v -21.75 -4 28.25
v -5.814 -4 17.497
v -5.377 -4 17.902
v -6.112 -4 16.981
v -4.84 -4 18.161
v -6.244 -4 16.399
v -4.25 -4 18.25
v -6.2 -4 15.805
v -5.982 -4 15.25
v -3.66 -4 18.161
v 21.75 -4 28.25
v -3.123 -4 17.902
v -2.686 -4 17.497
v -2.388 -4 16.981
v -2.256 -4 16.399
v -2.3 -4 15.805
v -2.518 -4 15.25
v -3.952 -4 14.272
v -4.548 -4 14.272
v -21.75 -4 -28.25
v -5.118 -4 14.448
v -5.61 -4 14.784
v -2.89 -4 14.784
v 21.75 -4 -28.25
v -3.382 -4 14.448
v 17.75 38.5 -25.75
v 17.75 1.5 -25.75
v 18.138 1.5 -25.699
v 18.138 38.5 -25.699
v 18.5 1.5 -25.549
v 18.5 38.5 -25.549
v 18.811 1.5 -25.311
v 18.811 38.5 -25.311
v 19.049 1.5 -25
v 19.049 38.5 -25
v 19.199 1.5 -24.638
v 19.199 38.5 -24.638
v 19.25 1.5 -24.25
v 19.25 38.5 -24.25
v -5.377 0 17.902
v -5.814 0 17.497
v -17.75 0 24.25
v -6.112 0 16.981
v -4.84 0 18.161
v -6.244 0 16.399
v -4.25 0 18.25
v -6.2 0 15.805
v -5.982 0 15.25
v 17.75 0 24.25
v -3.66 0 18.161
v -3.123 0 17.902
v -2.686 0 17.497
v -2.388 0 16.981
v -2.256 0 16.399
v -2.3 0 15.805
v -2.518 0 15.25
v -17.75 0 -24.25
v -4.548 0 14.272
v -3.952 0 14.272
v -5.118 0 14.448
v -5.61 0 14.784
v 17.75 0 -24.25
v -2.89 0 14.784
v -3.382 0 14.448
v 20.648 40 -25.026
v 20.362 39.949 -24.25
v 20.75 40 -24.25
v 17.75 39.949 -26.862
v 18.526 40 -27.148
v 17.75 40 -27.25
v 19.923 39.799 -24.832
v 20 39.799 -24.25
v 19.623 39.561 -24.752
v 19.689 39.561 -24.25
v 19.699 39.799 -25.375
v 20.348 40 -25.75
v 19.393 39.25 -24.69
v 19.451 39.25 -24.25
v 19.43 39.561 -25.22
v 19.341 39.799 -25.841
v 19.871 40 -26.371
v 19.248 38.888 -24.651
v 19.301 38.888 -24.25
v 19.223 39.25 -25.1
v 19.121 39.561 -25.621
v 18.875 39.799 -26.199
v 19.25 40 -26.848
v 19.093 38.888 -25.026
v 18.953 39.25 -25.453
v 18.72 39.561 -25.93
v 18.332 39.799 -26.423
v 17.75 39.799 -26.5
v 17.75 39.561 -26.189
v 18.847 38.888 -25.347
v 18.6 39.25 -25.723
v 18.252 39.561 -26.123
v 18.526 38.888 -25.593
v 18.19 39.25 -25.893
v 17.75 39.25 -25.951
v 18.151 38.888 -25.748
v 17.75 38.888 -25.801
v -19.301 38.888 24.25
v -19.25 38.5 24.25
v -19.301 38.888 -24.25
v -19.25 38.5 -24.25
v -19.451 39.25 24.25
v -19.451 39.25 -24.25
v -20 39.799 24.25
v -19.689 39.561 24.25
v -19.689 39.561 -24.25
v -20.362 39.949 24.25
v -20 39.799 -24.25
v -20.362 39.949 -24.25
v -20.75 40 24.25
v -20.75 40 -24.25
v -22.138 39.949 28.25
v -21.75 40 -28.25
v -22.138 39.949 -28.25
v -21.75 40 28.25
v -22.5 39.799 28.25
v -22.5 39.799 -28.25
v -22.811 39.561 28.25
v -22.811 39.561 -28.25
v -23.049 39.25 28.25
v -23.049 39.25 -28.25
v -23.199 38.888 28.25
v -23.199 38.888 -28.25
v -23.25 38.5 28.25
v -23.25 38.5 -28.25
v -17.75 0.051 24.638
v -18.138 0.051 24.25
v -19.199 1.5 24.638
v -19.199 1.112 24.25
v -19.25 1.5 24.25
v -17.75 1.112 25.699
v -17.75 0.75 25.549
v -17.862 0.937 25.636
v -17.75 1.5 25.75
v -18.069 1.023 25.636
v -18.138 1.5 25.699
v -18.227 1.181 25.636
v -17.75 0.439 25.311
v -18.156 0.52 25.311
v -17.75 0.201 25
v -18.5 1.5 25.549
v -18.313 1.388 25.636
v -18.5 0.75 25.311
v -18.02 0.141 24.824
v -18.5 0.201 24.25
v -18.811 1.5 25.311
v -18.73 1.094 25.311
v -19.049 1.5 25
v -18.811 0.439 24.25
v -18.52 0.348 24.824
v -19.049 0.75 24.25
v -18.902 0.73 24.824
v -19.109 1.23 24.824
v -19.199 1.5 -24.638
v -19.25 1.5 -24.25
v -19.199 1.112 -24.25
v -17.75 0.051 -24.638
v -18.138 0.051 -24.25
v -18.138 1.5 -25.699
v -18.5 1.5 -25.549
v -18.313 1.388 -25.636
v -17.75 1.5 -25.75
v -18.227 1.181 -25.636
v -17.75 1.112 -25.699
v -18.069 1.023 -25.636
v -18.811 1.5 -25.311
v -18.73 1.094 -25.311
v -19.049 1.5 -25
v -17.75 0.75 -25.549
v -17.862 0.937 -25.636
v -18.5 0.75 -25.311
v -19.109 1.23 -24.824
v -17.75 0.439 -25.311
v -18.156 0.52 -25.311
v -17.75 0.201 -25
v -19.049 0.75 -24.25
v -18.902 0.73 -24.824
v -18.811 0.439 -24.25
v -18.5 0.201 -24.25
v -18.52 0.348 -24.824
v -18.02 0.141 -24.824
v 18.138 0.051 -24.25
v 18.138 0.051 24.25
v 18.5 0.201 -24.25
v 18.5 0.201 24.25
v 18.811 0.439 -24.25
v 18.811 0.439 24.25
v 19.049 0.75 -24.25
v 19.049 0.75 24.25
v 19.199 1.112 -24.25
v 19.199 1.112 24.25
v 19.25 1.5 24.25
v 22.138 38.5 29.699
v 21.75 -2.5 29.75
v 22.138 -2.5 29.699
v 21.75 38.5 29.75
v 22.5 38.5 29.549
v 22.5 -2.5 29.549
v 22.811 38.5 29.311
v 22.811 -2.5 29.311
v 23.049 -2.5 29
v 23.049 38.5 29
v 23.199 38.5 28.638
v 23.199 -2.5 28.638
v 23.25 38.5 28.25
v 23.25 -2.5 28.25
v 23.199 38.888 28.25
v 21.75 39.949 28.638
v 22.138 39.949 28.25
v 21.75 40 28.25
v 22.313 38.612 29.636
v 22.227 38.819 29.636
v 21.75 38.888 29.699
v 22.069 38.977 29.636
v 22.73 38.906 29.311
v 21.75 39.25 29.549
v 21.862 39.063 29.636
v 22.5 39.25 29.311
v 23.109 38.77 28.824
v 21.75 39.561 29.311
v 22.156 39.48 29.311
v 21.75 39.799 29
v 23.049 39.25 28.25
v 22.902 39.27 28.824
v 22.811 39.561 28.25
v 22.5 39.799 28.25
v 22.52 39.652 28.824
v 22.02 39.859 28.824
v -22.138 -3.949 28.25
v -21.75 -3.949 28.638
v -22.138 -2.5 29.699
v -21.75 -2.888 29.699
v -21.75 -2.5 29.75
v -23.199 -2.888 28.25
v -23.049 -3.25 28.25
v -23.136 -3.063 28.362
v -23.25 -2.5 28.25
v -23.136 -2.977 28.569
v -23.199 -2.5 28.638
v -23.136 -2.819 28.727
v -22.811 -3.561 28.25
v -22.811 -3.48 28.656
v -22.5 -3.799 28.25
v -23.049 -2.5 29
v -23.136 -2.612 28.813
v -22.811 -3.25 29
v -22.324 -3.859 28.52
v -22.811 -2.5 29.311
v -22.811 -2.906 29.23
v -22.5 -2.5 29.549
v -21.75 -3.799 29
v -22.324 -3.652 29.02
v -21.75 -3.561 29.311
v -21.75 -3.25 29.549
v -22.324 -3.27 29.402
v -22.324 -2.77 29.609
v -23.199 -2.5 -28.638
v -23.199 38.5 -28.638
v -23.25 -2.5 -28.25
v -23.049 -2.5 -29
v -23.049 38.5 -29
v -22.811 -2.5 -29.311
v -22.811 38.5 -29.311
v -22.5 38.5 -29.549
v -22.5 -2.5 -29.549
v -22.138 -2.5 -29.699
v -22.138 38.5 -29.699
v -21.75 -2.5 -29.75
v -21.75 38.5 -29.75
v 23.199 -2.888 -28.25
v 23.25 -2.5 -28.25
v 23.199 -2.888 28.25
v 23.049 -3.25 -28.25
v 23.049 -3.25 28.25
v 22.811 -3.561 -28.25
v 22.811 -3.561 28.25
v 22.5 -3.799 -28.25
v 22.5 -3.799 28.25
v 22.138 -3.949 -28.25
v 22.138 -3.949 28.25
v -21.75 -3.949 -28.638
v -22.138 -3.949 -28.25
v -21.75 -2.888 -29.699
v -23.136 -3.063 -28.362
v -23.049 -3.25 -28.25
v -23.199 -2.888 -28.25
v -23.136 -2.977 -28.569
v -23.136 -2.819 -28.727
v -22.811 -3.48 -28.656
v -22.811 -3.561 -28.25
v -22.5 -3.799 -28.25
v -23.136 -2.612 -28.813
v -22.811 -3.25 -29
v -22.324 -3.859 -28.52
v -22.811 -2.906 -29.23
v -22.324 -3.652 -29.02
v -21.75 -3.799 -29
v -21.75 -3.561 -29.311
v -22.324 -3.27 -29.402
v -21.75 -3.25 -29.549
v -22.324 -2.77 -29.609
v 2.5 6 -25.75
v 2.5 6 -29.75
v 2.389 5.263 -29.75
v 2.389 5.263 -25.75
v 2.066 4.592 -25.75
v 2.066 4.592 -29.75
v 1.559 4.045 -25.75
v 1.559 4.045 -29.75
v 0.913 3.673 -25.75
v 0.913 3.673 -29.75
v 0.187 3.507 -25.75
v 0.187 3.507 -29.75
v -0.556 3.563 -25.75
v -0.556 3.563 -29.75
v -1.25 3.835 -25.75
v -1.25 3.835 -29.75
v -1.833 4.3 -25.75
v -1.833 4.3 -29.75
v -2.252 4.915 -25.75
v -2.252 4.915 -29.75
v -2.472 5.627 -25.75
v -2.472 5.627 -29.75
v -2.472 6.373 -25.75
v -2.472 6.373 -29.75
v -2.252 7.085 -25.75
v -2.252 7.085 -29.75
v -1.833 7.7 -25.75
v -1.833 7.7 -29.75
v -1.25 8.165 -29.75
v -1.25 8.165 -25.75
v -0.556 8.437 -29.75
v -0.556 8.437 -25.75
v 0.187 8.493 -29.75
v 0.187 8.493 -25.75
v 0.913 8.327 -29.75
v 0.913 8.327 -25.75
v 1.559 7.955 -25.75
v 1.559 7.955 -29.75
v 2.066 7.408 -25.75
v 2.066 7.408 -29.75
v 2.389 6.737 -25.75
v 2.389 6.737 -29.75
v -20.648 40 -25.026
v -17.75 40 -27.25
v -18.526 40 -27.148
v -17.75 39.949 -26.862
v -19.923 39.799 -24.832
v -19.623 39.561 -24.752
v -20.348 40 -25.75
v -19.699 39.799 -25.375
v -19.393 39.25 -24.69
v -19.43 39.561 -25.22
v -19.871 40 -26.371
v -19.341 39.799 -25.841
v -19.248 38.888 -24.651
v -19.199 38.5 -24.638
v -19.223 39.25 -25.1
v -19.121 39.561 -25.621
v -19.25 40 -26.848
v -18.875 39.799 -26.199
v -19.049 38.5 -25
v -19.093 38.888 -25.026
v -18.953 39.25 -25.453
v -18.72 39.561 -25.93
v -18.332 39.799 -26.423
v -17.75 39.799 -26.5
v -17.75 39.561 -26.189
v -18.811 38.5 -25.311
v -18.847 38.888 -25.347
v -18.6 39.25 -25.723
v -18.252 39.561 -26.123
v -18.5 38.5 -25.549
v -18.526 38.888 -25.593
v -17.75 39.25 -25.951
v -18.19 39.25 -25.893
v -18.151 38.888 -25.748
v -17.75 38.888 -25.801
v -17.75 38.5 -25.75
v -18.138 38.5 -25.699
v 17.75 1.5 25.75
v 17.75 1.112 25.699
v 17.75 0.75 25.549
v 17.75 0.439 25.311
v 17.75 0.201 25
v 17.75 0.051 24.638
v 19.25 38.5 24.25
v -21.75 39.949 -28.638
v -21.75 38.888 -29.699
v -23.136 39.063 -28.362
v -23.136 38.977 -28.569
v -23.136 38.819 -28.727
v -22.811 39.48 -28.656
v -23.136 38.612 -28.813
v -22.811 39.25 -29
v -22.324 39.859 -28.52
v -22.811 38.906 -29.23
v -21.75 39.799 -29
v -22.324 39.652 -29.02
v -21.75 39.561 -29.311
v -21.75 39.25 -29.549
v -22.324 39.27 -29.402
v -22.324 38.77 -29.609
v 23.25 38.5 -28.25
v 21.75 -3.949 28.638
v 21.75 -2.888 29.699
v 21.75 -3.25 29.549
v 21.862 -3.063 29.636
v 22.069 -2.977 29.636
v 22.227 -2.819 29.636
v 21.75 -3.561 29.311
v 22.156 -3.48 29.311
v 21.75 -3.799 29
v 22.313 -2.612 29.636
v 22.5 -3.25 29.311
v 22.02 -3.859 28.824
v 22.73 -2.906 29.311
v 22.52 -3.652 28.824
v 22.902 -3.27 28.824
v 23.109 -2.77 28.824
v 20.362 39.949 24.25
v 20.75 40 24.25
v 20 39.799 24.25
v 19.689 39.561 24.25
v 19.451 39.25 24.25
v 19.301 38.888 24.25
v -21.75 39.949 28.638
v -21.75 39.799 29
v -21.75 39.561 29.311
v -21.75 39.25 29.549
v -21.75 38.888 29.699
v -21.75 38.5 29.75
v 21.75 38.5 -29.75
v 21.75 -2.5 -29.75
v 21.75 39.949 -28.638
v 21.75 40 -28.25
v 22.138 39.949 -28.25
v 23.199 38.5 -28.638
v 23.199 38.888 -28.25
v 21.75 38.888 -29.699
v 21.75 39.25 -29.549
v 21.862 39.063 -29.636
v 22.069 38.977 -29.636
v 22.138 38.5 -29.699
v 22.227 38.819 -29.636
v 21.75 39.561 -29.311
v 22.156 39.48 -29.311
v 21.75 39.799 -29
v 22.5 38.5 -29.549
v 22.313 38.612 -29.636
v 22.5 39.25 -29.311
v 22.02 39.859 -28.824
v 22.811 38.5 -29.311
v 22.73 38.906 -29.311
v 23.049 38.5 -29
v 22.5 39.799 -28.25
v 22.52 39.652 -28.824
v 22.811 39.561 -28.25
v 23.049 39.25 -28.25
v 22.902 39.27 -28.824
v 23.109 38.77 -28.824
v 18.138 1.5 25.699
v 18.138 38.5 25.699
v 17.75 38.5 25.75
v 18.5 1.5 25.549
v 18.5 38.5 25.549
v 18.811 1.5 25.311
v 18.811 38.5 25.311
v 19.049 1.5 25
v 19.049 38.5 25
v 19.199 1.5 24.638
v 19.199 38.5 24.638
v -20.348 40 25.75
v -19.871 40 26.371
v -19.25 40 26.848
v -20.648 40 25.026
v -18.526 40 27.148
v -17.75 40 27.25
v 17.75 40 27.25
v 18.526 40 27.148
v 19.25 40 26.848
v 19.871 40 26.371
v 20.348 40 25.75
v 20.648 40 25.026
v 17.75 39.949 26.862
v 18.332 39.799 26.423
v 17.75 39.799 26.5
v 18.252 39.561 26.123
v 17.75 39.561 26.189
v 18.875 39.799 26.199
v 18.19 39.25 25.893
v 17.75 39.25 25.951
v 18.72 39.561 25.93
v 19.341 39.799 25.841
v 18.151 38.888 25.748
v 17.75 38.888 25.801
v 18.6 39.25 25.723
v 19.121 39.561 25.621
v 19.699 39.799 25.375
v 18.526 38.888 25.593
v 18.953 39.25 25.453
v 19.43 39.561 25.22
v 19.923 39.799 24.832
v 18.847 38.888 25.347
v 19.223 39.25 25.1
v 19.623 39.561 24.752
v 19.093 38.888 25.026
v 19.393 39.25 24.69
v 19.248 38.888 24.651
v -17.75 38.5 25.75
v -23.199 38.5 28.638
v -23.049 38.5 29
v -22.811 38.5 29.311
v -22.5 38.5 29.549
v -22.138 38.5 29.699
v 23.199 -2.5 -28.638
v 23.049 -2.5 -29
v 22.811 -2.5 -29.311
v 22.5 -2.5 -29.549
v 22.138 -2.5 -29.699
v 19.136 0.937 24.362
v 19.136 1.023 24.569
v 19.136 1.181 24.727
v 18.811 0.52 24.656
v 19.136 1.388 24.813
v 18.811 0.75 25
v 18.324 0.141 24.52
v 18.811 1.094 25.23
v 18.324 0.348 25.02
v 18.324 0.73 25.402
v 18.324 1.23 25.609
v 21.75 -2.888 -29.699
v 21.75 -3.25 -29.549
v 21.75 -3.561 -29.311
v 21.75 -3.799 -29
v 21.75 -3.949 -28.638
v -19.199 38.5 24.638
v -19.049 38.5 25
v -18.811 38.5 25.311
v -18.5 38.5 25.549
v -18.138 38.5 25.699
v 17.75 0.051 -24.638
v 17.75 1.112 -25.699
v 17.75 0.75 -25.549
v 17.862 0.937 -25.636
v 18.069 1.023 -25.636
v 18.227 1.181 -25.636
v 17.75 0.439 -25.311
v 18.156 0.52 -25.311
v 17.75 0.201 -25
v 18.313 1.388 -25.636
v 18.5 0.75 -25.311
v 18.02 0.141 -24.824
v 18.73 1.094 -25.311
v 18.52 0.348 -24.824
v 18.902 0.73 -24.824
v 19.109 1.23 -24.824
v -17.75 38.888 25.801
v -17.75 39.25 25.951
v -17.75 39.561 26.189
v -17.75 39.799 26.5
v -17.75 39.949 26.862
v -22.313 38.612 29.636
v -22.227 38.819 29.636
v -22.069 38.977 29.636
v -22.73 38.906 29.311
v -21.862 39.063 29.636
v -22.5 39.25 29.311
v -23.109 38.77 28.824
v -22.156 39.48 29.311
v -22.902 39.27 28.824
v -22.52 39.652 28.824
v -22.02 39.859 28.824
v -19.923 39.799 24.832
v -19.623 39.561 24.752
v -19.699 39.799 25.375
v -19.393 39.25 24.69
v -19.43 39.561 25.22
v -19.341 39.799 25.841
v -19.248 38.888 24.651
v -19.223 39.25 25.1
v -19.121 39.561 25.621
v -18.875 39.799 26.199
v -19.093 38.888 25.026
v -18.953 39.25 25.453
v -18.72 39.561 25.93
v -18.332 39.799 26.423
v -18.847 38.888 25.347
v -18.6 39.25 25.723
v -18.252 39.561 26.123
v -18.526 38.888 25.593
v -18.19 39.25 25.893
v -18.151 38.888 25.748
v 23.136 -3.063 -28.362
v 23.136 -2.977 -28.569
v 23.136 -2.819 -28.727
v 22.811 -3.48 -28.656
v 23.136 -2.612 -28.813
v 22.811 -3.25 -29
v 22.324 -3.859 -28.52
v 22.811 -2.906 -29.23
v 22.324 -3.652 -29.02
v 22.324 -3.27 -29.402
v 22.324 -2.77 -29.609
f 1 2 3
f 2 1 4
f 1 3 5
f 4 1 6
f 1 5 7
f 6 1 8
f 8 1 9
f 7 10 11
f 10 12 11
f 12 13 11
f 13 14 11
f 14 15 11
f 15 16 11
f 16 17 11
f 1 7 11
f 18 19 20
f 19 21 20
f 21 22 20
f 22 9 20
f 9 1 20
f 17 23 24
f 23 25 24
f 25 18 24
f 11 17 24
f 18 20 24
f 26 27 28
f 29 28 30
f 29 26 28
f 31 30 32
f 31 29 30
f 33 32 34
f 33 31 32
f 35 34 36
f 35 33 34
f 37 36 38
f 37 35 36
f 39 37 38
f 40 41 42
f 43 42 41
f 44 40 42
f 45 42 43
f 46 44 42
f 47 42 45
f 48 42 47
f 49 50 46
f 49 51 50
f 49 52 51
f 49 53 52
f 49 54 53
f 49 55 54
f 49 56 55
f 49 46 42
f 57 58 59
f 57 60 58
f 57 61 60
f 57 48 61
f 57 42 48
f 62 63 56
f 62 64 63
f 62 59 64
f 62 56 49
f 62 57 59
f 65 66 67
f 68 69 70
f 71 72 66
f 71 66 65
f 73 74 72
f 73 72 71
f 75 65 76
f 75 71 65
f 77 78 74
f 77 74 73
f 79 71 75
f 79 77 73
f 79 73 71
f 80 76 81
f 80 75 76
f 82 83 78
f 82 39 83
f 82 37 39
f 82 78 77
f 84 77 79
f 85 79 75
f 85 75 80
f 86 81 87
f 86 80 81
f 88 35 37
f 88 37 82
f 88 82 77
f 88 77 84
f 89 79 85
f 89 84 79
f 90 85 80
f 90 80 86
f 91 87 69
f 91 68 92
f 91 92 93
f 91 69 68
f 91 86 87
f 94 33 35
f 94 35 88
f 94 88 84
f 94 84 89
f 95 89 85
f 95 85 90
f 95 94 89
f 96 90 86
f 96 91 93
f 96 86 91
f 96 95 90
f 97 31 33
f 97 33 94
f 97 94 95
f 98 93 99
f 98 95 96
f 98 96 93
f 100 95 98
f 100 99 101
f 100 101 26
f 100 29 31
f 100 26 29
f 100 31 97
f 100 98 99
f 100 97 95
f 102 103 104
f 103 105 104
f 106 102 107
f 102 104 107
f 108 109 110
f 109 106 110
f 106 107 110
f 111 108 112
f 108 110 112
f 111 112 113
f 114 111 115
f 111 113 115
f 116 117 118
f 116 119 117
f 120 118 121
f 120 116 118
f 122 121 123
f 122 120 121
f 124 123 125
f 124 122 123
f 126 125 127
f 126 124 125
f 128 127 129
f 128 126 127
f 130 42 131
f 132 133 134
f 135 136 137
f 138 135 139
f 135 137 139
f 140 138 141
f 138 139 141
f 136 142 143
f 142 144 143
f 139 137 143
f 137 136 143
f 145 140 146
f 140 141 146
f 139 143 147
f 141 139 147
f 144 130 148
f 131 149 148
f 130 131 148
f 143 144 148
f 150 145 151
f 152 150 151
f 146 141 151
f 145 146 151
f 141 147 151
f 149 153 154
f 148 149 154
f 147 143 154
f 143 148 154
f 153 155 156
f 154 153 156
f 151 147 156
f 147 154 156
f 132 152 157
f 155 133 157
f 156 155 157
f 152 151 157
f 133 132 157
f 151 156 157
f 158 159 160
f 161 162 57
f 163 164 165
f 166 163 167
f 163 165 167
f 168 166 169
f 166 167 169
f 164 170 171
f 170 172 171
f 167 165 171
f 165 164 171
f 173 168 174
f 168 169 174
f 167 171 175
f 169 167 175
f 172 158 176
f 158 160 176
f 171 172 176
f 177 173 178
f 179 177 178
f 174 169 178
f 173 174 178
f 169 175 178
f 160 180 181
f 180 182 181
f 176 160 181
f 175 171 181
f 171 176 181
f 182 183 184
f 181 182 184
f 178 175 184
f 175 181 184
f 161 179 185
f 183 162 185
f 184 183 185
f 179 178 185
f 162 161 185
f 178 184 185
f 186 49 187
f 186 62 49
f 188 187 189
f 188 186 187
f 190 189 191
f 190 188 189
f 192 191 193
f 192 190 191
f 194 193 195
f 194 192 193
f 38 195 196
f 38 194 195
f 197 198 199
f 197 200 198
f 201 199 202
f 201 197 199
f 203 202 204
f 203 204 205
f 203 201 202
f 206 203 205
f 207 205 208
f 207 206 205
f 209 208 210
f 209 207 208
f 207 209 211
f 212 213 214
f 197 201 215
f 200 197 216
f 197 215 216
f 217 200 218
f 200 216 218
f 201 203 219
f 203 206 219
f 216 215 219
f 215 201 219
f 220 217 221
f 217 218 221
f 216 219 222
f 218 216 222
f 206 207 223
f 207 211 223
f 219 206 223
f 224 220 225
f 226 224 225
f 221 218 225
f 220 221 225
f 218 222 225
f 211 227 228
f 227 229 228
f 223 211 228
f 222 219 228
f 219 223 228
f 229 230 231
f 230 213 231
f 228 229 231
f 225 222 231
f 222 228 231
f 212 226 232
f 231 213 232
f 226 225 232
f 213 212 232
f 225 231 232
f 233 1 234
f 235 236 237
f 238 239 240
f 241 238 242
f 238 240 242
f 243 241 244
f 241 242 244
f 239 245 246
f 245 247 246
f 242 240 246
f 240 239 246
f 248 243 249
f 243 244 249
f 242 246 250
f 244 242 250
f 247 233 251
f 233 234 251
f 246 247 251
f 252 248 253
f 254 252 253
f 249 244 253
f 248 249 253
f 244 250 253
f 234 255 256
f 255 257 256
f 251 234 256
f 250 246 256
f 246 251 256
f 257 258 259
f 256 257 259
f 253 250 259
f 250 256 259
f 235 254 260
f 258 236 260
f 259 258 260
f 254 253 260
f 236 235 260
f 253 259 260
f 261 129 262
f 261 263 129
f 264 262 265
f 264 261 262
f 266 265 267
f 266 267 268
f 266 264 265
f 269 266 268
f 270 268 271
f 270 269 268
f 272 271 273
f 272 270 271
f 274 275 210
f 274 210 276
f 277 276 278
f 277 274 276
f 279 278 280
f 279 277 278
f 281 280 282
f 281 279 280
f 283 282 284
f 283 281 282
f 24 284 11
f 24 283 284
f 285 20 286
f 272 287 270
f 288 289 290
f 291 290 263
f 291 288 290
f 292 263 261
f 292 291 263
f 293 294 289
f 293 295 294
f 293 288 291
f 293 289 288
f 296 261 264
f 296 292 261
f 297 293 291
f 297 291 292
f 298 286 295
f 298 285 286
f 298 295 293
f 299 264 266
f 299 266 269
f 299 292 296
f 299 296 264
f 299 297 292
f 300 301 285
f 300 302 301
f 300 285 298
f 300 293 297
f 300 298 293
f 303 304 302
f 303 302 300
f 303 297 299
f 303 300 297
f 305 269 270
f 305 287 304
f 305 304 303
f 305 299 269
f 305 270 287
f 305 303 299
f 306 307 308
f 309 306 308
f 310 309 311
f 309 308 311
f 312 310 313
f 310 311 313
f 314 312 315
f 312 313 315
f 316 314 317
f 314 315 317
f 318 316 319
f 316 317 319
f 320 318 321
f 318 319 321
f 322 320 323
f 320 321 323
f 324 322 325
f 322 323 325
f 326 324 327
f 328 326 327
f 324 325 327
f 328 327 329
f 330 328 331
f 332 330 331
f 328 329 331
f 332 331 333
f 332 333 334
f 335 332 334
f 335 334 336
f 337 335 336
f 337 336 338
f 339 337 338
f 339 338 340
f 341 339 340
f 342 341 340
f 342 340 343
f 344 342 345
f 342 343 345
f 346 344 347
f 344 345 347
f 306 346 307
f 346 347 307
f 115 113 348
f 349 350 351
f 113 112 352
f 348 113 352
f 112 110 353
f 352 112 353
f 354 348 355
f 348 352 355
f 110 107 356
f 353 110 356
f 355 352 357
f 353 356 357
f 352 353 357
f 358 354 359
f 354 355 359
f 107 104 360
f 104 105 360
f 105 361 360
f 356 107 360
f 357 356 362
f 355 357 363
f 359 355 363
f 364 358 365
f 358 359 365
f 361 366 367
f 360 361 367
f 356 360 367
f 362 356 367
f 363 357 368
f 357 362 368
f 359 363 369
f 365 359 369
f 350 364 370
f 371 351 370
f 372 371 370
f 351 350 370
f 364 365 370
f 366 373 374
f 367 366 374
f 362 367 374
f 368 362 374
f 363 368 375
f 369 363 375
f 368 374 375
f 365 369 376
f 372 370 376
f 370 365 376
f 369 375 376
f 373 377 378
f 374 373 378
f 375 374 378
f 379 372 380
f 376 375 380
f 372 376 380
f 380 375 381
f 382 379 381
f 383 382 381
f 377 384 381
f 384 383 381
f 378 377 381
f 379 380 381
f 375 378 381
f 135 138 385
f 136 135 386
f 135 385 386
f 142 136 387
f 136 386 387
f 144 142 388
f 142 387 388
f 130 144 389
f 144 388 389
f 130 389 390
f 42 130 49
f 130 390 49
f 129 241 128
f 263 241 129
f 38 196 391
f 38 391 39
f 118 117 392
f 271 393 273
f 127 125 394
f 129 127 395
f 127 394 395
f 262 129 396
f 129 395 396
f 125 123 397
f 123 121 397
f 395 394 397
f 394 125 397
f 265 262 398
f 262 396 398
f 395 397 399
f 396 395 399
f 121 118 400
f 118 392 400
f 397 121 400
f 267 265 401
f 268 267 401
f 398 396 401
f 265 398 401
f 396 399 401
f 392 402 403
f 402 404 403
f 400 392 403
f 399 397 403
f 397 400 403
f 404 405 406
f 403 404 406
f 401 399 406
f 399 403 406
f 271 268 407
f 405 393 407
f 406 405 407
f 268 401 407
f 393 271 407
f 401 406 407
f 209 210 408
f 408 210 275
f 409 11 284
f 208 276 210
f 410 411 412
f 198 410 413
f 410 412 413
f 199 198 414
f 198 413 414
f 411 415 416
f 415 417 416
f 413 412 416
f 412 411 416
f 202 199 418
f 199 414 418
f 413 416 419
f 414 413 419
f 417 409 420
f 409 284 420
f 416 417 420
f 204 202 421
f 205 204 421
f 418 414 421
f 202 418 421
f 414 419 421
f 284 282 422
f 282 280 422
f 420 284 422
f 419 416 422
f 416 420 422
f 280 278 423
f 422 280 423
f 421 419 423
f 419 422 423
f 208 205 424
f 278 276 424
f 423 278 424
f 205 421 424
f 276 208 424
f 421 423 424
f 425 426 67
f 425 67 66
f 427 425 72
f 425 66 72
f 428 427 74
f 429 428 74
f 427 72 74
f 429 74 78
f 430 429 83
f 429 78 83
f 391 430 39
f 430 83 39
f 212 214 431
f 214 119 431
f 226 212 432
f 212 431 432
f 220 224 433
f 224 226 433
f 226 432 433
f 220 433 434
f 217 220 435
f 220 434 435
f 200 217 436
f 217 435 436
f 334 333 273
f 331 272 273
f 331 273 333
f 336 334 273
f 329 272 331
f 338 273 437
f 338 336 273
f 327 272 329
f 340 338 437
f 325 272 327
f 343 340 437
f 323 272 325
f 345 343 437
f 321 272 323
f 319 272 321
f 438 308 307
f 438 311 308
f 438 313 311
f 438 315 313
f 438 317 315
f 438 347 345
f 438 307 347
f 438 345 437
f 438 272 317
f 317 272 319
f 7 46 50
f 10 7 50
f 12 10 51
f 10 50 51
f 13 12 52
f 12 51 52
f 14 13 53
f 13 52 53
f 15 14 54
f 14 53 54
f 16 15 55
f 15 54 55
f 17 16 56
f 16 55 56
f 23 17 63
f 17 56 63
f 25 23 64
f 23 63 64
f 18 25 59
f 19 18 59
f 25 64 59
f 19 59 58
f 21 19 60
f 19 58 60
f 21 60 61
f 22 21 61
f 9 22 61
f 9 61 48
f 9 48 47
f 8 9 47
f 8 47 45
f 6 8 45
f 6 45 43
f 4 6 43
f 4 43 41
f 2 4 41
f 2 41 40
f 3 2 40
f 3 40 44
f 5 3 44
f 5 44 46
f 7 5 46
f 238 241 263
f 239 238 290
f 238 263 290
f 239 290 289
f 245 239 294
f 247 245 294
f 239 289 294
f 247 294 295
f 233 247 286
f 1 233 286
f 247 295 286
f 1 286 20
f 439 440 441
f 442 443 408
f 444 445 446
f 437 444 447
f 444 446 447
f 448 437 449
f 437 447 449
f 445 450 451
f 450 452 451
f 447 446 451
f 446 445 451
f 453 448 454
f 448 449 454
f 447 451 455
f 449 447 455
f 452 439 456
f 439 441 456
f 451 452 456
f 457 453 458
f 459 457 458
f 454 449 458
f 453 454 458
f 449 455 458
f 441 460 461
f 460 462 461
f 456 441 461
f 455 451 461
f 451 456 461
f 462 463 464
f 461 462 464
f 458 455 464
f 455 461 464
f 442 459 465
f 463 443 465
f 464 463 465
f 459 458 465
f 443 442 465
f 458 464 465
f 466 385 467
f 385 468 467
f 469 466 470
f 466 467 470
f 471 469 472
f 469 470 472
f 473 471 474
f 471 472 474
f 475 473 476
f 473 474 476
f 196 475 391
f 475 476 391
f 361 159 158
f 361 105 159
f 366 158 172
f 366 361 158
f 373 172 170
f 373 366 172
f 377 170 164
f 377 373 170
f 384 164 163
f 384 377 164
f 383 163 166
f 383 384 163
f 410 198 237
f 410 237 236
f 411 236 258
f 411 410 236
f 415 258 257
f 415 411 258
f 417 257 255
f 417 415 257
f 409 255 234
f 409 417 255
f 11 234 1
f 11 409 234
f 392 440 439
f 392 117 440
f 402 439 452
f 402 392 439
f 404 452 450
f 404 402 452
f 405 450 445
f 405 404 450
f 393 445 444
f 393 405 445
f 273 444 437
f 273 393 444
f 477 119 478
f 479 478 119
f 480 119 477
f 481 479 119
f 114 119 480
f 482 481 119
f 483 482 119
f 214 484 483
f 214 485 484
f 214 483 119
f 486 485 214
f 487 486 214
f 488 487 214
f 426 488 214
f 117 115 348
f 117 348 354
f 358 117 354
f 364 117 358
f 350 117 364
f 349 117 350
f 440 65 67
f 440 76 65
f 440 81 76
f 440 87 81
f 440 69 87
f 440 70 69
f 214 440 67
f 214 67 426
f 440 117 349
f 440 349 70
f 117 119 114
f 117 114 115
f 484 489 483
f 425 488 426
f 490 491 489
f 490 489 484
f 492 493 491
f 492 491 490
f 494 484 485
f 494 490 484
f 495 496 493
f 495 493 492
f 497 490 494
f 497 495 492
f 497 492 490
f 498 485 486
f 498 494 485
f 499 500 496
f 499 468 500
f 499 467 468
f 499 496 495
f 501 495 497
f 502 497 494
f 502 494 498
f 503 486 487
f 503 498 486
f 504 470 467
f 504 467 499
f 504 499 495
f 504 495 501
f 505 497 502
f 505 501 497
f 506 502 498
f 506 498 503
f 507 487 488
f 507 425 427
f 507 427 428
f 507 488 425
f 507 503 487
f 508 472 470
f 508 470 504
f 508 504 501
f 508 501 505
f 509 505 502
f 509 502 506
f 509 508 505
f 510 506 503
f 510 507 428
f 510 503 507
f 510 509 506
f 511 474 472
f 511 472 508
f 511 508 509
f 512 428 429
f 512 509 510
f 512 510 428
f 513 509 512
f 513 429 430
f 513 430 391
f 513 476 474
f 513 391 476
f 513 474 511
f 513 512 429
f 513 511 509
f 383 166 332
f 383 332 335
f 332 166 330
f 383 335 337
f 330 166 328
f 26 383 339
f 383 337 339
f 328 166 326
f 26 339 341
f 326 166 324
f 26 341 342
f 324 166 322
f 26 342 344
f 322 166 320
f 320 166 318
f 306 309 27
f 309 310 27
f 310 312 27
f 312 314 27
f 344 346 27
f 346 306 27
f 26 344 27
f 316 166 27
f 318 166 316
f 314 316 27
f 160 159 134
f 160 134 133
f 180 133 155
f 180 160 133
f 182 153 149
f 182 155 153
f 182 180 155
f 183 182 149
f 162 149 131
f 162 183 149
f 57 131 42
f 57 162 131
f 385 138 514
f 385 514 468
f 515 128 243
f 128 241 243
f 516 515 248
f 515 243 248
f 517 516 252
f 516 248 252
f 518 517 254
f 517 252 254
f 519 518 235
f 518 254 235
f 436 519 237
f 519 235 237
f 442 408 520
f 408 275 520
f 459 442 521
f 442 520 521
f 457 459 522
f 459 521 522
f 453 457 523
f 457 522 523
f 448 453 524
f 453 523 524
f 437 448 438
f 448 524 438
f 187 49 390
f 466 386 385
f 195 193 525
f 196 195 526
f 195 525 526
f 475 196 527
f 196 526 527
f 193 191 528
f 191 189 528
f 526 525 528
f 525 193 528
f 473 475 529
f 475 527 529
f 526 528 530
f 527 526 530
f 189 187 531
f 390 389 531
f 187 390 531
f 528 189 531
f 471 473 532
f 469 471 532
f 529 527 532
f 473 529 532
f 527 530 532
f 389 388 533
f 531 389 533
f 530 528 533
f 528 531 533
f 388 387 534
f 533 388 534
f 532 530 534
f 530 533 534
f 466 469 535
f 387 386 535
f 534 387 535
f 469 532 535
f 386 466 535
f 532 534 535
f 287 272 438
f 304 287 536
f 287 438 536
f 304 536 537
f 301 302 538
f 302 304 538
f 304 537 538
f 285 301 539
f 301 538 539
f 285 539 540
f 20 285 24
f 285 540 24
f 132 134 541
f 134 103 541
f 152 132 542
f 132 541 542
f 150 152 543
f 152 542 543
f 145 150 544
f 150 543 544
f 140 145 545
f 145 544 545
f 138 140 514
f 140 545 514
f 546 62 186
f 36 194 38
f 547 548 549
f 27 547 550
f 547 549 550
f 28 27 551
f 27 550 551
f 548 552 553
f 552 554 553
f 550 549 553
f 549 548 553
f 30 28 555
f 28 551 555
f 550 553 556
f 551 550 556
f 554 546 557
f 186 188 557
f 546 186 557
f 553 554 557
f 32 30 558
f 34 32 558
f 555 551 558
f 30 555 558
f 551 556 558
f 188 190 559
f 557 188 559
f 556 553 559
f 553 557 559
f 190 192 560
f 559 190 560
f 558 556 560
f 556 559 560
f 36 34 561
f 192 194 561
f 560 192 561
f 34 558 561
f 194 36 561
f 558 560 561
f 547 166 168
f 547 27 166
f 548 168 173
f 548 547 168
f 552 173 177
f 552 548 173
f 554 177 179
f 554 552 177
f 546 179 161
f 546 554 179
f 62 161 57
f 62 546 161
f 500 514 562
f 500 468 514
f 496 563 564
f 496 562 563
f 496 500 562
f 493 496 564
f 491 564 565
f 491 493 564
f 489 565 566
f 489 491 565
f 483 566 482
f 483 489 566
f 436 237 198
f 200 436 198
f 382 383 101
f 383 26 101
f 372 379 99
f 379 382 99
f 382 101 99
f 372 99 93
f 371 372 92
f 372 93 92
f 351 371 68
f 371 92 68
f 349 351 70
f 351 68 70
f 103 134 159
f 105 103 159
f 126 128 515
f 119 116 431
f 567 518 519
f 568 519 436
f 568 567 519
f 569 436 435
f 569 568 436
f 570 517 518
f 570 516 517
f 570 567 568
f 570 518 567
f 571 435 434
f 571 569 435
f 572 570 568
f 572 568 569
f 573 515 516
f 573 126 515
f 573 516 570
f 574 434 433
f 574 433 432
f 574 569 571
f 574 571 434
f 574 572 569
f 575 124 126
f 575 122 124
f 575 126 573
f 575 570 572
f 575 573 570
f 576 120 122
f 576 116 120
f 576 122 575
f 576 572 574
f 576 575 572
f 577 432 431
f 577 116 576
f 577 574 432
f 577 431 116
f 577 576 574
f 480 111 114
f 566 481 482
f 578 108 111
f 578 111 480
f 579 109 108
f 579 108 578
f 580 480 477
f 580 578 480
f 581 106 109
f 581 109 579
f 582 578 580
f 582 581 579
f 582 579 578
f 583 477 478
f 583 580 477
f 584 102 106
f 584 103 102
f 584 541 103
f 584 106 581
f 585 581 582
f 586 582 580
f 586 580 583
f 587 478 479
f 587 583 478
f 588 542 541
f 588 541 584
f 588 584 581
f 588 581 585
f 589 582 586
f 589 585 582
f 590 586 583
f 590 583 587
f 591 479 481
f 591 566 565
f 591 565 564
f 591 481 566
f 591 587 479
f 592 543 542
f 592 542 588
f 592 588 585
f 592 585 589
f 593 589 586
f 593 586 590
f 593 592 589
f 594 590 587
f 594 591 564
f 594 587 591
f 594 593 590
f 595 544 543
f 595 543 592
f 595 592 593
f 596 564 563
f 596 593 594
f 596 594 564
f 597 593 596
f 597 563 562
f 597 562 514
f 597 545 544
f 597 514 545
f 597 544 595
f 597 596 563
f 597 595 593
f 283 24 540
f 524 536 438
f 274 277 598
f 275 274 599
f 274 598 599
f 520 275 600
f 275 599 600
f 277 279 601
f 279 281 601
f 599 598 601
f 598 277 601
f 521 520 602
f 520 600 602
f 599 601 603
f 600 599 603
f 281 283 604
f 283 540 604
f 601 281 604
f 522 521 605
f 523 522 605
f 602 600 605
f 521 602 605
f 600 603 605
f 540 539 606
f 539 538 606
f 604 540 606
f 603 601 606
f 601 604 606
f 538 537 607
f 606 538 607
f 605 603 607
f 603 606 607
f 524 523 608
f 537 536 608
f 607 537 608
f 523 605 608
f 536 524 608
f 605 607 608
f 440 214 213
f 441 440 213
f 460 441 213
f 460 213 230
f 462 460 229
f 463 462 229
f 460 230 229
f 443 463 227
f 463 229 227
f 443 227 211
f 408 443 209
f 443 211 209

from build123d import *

# Parameters (mm, degrees)
SKETCH1_W           = 38.5
SKETCH1_H           = 51.5
BOSS_EXTRUDE1_DEPTH = 40
SHELL1_T            = 4
SKETCH2_R           = 2.5
CUT_EXTRUDE3_DEPTH  = 4
FILLET2_R           = 1.5
SKETCH5_R           = 2
CUT_EXTRUDE4_DEPTH  = 56.005681525


with BuildPart() as part:
    # Sketch1 → Boss-Extrude1 (new body)
    with BuildSketch(Plane(origin=(0, 0, 0), x_dir=(1, 0, 0), z_dir=(0, 1, 0))):
        Rectangle(SKETCH1_W, SKETCH1_H)
    extrude(amount=BOSS_EXTRUDE1_DEPTH)

    # Shell1
    shell1_openings = [part.faces().sort_by_distance(p)[0] for p in [
        (0, 40, 0),
    ]]
    offset(amount=SHELL1_T, openings=shell1_openings, kind=Kind.INTERSECTION)

    # Sketch2 → Cut-Extrude3 (cut)
    with BuildSketch(Plane(origin=(0, 0, -29.75), x_dir=(-1, 0, 0), z_dir=(0, 0, -1))):
        with Locations(Location((0, 6, 0), (0, 0, 180))):
            Circle(SKETCH2_R)
    extrude(amount=-CUT_EXTRUDE3_DEPTH, mode=Mode.SUBTRACT)

    # Fillet2
    fillet2_edges = [part.edges().sort_by_distance(p)[0] for p in [
        (23.25, 40, 0),
        (0, 40, -29.75),
        (-19.25, 0, 0),
        (-19.25, 20, -25.75),
        (0, 0, 25.75),
        (-19.25, 20, 25.75),
        (19.25, 0, 0),
        (19.25, 20, 25.75),
        (0, 0, -25.75),
        (19.25, 20, -25.75),
        (-19.25, 40, 0),
        (0, 40, 25.75),
        (19.25, 40, 0),
        (0, 40, -25.75),
        (-23.25, 40, 0),
        (0, -4, -29.75),
        (23.25, -4, 0),
        (0, -4, 29.75),
        (-23.25, -4, 0),
        (-23.25, 18, -29.75),
        (23.25, 18, -29.75),
        (23.25, 18, 29.75),
        (-23.25, 18, 29.75),
        (0, 40, 29.75),
    ]]
    fillet(fillet2_edges, radius=FILLET2_R)

    # Sketch5 → Cut-Extrude4 (cut, through all)
    with BuildSketch(Plane(origin=(0, 0, 0), x_dir=(1, 0, 0), z_dir=(0, 1, 0))):
        with Locations(Location((-4.25, -16.25, 0), (0, 0, 270))):
            Circle(SKETCH5_R)
    extrude(amount=-CUT_EXTRUDE4_DEPTH, mode=Mode.SUBTRACT)


solid = part.part
